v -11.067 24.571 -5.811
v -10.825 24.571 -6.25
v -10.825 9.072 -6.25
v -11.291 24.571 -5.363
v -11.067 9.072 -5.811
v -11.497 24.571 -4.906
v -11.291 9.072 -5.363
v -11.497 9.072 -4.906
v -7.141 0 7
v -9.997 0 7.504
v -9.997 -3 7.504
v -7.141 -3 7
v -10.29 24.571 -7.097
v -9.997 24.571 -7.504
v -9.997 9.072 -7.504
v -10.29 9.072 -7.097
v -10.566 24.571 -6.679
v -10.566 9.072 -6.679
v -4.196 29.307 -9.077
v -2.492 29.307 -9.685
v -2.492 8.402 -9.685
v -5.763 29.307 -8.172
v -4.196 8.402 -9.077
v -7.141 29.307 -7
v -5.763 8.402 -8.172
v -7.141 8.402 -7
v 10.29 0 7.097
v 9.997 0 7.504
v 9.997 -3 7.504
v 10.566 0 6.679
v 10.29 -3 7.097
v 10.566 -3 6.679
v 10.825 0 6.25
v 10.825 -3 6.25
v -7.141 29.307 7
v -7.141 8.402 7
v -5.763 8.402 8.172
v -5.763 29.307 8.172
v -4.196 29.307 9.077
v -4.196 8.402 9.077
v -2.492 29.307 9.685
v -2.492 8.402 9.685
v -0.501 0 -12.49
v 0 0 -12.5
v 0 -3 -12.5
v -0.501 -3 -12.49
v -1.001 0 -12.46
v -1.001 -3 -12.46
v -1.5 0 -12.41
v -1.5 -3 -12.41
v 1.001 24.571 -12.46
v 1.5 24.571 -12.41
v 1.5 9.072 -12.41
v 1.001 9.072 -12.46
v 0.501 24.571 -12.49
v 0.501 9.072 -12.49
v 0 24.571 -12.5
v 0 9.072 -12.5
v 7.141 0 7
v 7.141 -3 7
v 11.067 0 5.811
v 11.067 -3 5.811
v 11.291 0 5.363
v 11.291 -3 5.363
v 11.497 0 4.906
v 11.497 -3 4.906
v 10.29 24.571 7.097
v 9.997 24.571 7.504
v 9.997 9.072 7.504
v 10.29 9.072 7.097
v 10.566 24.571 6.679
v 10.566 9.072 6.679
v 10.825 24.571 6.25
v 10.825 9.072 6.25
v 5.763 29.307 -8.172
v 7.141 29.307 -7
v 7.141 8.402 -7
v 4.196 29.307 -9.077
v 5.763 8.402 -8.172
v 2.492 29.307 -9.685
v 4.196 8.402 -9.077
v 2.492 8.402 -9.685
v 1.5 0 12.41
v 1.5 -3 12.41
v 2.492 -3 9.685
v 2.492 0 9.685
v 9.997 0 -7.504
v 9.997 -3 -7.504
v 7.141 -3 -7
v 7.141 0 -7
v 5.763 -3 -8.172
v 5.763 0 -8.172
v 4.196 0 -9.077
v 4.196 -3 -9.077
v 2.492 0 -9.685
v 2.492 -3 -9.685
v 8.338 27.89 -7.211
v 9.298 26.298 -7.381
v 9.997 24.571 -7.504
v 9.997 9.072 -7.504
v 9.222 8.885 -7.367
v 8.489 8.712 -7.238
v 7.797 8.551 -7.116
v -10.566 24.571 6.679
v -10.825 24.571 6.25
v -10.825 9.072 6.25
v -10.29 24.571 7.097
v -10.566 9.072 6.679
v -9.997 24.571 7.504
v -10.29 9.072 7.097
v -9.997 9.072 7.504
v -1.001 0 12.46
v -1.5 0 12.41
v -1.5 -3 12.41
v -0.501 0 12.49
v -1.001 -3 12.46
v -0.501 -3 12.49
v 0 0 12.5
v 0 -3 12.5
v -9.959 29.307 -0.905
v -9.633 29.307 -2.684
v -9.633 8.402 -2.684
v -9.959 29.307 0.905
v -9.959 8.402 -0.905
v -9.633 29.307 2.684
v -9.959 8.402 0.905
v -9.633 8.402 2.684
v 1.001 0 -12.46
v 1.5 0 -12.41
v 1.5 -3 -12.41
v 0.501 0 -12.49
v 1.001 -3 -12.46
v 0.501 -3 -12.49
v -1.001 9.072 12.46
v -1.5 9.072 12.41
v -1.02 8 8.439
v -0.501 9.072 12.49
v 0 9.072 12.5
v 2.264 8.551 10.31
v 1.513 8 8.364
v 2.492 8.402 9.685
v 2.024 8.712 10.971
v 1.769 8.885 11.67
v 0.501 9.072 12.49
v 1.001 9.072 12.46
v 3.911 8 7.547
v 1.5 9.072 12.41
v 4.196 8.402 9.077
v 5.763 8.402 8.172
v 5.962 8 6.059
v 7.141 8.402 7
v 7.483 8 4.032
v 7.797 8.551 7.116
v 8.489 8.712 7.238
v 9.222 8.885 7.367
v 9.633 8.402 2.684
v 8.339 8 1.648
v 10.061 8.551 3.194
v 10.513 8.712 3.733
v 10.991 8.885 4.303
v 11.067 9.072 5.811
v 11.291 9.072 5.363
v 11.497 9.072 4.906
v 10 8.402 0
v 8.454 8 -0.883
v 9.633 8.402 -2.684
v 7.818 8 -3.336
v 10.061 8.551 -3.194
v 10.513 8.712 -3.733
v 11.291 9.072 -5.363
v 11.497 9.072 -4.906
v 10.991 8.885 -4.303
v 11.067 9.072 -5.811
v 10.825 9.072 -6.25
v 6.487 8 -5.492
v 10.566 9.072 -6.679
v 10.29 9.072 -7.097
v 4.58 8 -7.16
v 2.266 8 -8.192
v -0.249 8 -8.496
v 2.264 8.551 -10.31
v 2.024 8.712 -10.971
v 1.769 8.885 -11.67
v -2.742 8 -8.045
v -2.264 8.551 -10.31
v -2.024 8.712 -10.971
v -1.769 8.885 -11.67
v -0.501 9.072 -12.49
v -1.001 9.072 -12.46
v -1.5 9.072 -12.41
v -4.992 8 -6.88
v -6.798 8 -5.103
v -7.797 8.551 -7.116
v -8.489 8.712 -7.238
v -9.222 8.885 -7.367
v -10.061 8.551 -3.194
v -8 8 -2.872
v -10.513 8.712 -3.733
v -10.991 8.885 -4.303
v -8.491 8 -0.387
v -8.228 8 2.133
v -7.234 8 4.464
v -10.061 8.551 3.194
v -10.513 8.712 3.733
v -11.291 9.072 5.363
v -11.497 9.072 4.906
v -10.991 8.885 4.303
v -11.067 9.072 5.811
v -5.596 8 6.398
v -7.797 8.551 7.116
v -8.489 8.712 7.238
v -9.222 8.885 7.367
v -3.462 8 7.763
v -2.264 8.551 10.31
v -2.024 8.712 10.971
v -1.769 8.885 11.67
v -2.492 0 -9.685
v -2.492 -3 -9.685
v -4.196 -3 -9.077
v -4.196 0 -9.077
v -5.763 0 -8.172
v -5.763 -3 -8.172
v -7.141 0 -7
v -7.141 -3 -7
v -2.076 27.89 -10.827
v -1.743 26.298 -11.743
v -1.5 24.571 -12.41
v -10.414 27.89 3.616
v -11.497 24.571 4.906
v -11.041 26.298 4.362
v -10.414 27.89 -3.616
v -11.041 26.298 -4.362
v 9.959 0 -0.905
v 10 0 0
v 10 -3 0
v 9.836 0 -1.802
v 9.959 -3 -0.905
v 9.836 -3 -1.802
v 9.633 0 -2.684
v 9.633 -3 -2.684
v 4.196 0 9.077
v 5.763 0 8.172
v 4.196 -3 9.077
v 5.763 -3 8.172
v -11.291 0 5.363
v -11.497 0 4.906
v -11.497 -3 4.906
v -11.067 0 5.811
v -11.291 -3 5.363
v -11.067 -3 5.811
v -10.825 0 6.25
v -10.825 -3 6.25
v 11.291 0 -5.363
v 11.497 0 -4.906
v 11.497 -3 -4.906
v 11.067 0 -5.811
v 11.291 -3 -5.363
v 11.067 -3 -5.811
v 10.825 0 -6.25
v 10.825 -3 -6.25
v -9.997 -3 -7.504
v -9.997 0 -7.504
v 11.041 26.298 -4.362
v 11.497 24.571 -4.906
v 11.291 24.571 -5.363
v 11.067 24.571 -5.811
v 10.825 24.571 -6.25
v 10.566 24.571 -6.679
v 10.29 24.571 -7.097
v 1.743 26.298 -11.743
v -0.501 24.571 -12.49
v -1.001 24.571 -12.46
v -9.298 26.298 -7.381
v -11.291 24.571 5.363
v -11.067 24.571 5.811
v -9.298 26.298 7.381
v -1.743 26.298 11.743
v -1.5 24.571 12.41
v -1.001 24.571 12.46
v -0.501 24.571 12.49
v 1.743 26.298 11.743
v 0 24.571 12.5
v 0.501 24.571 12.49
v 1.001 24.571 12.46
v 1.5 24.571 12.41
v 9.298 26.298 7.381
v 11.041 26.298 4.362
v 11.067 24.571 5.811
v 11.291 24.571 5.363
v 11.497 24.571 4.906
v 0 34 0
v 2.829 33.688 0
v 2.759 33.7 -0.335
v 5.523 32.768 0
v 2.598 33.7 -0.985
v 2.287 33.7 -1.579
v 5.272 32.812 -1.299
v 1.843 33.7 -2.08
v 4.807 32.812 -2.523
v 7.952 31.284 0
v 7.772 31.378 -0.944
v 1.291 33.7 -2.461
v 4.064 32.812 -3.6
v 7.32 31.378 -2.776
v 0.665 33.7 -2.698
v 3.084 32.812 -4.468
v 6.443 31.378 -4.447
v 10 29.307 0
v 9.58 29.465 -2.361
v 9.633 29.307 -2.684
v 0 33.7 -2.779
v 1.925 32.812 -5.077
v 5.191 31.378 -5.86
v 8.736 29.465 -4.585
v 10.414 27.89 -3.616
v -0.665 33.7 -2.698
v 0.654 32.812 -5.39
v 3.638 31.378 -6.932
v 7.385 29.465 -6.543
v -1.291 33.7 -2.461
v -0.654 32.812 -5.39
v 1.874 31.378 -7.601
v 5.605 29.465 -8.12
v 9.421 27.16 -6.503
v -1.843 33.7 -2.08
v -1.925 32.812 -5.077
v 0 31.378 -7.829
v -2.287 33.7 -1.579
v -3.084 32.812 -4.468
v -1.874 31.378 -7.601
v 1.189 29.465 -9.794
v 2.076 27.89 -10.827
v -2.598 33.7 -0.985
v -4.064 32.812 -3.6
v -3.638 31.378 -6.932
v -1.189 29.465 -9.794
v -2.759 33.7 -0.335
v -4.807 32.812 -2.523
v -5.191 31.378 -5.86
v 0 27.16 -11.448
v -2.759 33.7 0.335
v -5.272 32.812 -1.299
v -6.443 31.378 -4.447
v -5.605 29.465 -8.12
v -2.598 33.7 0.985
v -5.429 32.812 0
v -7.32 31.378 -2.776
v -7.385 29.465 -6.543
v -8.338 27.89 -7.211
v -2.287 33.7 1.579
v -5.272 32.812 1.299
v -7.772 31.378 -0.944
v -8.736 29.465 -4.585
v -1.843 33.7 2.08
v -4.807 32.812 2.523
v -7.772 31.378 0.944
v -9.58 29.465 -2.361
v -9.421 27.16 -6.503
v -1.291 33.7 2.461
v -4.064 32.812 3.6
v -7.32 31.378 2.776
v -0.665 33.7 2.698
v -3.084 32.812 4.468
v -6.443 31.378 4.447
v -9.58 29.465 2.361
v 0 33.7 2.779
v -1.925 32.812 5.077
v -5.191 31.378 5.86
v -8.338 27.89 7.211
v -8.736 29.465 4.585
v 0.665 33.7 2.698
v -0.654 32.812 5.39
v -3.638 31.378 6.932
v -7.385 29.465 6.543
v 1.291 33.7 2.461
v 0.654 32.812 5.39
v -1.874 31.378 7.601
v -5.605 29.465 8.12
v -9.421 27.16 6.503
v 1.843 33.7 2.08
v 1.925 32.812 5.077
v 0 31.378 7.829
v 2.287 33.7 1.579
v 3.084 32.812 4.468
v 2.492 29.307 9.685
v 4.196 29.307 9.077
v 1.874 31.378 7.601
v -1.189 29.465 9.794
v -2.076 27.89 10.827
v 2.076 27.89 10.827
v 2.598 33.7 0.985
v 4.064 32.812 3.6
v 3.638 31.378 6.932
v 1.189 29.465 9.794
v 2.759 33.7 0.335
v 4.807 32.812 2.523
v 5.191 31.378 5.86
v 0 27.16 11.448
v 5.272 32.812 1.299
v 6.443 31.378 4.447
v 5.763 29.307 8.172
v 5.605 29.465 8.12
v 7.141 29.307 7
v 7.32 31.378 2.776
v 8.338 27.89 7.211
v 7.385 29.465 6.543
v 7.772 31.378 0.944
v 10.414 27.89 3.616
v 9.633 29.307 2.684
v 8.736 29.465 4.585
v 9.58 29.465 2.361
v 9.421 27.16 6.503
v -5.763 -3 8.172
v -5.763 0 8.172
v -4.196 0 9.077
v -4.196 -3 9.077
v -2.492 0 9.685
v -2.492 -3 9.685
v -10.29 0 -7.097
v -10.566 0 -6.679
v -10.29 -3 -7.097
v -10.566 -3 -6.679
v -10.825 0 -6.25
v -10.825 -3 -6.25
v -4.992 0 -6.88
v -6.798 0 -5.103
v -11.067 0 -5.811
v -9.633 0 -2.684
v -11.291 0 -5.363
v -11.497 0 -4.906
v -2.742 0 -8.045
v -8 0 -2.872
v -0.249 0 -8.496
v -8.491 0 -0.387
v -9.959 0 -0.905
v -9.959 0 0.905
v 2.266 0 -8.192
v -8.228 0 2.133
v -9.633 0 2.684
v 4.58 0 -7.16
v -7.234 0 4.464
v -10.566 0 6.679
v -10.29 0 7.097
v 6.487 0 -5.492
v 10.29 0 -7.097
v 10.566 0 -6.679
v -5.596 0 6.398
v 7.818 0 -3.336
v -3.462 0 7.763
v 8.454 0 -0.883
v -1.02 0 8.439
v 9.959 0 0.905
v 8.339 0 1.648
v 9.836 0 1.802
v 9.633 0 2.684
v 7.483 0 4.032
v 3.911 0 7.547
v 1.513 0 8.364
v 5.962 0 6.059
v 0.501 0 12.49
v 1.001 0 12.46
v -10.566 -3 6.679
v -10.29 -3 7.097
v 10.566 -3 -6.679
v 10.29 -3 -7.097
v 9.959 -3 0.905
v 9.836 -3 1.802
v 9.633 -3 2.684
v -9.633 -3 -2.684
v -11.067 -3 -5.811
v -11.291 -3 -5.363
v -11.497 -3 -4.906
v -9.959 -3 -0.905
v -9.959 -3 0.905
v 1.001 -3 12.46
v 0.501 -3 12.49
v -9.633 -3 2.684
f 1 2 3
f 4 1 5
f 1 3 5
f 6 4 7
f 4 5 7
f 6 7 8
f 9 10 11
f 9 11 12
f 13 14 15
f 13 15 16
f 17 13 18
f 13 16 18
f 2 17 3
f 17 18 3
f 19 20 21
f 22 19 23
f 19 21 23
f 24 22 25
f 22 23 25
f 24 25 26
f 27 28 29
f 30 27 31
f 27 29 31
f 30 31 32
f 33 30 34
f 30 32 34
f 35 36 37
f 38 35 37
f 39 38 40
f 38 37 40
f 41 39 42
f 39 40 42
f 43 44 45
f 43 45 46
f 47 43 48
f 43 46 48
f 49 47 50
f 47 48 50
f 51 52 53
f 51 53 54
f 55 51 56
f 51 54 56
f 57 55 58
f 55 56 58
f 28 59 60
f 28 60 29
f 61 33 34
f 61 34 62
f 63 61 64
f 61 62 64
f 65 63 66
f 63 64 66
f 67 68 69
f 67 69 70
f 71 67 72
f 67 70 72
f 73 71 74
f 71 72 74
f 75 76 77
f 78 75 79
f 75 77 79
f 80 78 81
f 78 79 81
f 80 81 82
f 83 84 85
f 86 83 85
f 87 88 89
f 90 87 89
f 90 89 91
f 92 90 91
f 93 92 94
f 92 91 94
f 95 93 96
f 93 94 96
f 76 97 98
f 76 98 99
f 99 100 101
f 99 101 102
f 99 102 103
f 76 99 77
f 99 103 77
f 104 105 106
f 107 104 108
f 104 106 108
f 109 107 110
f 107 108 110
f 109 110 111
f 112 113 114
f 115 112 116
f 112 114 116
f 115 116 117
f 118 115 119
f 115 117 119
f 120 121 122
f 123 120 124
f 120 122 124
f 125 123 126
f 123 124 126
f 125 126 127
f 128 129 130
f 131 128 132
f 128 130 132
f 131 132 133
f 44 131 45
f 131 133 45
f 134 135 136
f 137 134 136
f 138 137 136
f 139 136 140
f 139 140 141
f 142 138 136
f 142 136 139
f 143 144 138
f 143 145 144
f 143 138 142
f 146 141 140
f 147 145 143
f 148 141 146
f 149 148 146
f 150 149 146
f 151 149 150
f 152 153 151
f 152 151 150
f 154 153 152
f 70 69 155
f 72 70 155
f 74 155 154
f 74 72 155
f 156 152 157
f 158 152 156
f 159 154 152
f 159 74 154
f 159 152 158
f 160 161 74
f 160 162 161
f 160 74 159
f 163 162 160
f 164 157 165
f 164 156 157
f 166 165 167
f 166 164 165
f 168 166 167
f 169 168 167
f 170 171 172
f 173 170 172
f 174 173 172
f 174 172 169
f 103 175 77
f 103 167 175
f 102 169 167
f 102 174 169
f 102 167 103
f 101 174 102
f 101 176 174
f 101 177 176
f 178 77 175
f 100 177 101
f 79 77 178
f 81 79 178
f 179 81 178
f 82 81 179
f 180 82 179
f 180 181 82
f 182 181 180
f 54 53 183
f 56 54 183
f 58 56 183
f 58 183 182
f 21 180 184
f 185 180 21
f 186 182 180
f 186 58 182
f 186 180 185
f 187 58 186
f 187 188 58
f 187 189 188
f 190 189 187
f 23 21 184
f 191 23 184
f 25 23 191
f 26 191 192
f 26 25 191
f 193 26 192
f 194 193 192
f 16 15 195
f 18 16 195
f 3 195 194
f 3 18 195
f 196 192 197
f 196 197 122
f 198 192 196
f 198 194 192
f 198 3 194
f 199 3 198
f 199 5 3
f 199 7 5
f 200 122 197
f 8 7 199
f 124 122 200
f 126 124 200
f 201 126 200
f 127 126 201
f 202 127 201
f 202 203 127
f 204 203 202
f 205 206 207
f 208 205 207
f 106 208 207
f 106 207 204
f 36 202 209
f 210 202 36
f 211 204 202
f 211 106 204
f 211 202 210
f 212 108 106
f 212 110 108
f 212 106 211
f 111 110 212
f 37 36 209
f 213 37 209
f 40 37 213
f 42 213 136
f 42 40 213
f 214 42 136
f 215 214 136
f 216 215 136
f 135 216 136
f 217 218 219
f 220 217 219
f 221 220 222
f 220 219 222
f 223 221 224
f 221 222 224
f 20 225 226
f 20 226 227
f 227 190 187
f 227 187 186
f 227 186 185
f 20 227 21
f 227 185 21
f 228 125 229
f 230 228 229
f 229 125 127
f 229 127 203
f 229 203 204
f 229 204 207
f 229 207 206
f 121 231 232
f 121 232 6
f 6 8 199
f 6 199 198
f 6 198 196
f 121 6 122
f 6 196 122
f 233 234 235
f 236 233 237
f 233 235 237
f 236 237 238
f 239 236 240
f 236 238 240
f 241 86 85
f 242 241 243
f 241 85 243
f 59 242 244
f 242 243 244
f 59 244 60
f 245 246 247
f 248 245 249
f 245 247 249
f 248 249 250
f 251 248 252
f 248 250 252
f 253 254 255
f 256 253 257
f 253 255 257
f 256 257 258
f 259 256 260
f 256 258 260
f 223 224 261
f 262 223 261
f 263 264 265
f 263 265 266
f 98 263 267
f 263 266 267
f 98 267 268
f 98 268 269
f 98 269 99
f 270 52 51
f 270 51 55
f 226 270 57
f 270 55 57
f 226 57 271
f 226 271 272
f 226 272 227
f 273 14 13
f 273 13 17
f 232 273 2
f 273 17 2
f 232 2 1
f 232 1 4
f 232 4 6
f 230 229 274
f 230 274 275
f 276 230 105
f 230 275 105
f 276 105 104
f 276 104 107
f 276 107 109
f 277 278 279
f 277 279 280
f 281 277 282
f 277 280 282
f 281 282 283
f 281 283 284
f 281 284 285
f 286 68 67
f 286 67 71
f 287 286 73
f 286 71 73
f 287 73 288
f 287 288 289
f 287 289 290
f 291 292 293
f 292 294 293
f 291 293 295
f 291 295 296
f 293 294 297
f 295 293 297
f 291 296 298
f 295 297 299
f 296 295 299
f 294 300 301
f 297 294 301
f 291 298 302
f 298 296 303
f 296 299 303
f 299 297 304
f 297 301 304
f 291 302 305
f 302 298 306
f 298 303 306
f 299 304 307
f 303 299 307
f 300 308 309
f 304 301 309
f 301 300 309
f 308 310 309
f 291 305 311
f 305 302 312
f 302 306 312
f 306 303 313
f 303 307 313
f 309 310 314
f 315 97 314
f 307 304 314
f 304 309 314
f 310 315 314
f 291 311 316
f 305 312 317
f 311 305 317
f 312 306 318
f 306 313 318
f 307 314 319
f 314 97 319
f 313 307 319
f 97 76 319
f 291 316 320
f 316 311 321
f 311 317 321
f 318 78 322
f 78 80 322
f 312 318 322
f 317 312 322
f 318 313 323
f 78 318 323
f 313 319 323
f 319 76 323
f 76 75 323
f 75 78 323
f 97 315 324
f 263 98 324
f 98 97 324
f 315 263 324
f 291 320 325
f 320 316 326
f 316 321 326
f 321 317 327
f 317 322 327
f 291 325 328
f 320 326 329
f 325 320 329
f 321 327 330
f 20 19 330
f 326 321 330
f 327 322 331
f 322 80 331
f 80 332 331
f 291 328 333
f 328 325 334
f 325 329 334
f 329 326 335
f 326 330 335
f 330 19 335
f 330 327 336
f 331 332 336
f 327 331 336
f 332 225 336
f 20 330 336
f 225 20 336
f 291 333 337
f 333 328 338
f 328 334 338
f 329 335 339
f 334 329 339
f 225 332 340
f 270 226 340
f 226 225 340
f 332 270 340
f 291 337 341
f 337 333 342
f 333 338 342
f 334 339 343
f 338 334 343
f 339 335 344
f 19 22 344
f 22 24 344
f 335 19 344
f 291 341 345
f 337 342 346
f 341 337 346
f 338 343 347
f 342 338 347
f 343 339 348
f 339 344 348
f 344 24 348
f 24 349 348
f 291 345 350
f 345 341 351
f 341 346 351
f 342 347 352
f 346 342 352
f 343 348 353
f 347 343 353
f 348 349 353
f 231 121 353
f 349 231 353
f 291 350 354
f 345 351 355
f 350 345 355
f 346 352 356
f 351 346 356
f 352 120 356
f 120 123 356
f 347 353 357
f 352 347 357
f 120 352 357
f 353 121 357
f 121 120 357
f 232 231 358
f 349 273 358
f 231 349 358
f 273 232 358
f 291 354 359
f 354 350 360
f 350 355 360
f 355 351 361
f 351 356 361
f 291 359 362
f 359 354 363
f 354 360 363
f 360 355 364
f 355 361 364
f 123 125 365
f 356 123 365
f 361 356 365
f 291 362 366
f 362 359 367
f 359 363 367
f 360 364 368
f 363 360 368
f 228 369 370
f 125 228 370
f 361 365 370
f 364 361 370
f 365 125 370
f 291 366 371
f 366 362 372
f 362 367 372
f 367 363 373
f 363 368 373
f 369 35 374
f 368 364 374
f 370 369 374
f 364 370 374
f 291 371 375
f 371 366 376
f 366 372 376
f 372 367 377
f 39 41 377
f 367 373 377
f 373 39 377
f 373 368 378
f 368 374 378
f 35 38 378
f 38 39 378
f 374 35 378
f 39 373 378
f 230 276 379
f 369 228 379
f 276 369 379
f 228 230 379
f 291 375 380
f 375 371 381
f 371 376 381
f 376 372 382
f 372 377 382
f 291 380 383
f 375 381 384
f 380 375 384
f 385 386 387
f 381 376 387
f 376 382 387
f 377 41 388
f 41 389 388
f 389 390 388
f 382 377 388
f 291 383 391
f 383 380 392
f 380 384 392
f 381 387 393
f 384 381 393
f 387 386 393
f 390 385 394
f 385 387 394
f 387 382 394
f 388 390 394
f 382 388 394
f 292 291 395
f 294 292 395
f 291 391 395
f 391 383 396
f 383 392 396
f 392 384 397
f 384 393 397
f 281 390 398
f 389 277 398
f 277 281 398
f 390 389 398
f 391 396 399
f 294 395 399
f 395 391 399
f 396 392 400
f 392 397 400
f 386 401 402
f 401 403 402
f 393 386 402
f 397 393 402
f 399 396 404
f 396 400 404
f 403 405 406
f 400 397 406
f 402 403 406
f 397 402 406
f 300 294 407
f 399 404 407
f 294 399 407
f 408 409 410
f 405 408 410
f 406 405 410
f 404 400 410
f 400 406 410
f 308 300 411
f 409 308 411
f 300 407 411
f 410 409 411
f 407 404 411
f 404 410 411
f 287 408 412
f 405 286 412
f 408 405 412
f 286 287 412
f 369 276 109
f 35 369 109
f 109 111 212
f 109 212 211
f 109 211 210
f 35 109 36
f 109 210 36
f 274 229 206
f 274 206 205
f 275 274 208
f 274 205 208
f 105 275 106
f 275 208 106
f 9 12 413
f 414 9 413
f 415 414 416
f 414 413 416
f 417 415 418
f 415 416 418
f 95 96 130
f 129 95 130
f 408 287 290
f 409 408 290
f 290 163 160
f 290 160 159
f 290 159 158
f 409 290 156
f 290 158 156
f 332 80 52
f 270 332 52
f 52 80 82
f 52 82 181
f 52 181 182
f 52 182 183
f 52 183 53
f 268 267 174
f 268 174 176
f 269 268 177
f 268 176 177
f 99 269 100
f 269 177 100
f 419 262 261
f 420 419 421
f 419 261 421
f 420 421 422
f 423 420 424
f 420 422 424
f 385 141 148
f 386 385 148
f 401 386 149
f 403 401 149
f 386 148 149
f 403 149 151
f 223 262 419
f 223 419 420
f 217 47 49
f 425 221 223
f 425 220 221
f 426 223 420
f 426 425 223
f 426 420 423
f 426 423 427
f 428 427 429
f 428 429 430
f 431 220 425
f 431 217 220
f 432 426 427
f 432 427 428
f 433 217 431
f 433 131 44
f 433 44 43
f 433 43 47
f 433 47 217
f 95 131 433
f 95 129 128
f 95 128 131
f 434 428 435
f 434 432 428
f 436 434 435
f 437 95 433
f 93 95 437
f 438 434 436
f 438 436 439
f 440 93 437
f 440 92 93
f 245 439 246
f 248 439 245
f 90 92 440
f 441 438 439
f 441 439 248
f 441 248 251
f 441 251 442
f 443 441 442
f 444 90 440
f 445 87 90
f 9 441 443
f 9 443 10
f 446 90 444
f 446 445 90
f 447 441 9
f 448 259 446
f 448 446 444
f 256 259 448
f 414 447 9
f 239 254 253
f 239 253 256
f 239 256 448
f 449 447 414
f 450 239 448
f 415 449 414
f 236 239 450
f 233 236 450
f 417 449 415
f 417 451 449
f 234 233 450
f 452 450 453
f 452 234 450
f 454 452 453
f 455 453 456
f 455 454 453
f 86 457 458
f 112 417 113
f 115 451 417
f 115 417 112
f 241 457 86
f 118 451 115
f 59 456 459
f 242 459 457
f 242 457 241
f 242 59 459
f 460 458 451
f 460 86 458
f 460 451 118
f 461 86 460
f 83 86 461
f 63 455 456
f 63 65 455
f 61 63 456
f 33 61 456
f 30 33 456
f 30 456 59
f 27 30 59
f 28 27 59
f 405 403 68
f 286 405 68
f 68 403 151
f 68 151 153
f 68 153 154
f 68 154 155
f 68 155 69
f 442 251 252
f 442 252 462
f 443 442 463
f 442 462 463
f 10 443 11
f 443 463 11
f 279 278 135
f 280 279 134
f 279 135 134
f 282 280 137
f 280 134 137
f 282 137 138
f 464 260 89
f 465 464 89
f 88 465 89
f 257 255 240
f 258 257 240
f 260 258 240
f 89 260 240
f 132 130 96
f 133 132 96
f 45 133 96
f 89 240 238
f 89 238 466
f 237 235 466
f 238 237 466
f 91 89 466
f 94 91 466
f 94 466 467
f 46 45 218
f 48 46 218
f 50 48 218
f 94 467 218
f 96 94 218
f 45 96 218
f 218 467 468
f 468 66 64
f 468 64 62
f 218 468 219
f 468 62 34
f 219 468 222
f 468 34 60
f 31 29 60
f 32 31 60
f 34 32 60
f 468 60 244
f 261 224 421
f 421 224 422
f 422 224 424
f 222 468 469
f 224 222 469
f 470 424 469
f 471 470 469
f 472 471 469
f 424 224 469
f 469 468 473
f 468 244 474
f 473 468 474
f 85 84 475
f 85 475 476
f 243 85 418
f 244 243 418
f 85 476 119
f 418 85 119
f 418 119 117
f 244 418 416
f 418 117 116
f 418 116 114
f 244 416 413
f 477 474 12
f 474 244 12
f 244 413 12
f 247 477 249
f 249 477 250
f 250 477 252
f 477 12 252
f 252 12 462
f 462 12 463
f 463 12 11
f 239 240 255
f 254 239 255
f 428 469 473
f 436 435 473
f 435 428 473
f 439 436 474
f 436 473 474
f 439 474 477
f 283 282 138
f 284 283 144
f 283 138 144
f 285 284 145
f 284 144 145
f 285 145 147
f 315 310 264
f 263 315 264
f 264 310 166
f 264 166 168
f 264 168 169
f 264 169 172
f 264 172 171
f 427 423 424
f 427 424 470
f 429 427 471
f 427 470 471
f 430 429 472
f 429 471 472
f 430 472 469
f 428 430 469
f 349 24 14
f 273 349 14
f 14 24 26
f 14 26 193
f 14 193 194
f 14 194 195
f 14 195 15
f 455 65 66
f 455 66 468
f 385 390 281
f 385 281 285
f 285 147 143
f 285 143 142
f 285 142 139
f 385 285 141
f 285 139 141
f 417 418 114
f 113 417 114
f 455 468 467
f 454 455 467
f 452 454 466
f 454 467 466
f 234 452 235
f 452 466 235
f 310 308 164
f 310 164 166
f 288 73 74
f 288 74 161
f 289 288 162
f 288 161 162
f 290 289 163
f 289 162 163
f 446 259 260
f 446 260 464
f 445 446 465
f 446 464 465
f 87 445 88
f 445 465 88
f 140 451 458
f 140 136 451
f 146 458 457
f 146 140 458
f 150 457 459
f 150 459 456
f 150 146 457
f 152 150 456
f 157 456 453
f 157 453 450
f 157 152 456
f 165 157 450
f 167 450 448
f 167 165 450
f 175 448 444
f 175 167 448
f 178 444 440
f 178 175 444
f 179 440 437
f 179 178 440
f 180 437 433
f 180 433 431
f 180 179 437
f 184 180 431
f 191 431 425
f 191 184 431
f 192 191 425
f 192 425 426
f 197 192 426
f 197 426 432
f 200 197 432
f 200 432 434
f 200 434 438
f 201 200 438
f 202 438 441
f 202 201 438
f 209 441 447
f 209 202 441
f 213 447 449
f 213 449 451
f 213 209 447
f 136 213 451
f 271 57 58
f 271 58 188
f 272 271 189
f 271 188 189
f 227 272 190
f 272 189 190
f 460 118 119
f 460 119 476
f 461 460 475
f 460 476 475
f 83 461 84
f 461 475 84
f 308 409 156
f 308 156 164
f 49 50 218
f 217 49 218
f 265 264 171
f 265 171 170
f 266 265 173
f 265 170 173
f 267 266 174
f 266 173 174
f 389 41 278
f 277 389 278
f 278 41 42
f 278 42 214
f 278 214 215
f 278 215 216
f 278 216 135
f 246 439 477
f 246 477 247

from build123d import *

# Parameters (mm, degrees)
EXTRUDE_1_DEPTH          = 34
EXTRUDE_1_DEPTH_BACK     = 3
EXTRUDE_START            = -3
EXTRUDE_2_DEPTH          = 37
PATTERN_CIRCULAR_1_COUNT = 6


# Read off the part's stored shape, not the designer's step: 切除-旋转-薄壁1
with BuildPart() as part:
    # 草图2 → 凸台-拉伸1 (new, two sides: drawn at the far end of the back side and taken through both)
    with BuildSketch(Plane(origin=(0, 0, 0), x_dir=(1, 0, 0), z_dir=(0, 1, 0)).offset(-EXTRUDE_1_DEPTH_BACK)):
        with BuildLine():
            ThreePointArc((-2.491861702, -9.684556018), (-1.255874162, -9.920825575), (0, -10))
            Line((0, -10), (0, 10))
            ThreePointArc((0, 10), (-9.920825575, 1.255874162), (-2.491861702, -9.684556018))
        make_face()
        with BuildLine():
            Line((0, 10), (0, -10))
            ThreePointArc((0, -10), (1.255874162, -9.920825575), (2.491861702, -9.684556018))
            ThreePointArc((2.491861702, -9.684556018), (7.903120175, -6.127045903), (10, 0))
            ThreePointArc((10, 0), (7.071067812, 7.071067812), (0, 10))
        make_face()
    extrude(amount=EXTRUDE_1_DEPTH + EXTRUDE_1_DEPTH_BACK)

    # 草图2<3> → 凸台-拉伸2 (add)
    with BuildSketch(Plane(origin=(0, 0, 0), x_dir=(1, 0, 0), z_dir=(0, 1, 0)).offset(EXTRUDE_START)):
        with BuildLine():
            ThreePointArc((-1.5, -12.409673646), (-0.751358578, -12.477397977), (0, -12.5))
            Line((0, -12.5), (0, -10))
            ThreePointArc((0, -10), (-1.255874162, -9.920825575), (-2.491861702, -9.684556018))
            Line((-2.491861702, -9.684556018), (-1.5, -12.409673646))
        make_face()
        with BuildLine():
            Line((0, -10), (0, -12.5))
            ThreePointArc((0, -12.5), (0.751358578, -12.477397977), (1.5, -12.409673646))
            Line((1.5, -12.409673646), (2.491861702, -9.684556018))
            ThreePointArc((2.491861702, -9.684556018), (1.255874162, -9.920825575), (0, -10))
        make_face()
    extrude_2 = extrude(amount=EXTRUDE_2_DEPTH)

    # 阵列(圆周)1: 凸台-拉伸2 ×6 about axis
    pattern_circular_1_axis = Axis((0, 0, 0), (0, 1, 0))
    for i in range(1, PATTERN_CIRCULAR_1_COUNT):
        add(extrude_2.rotate(pattern_circular_1_axis, i * 360 / PATTERN_CIRCULAR_1_COUNT))

    # 草图3 → 切除-旋转1 (revolve, cut)
    with BuildSketch(Plane(origin=(0, 0, 0), x_dir=(0, 0, -1), z_dir=(1, 0, 0)), mode=Mode.PRIVATE) as cut_revolve_1_sk:
        Polygon((-12.5, 0), (-8.5, 0), (-8.5, 8), (-12.5, 9.07179677), align=None)
    revolve(cut_revolve_1_sk.sketch.rotate(Axis((0, -3, 0), (0, 1, 0)), 353.107897421), axis=Axis((0, -3, 0), (0, 1, 0)), mode=Mode.SUBTRACT)

    # 切除-旋转-薄壁1 outline → 切除-旋转-薄壁1 (revolve, cut)
    with BuildSketch(Plane.XY):
        with BuildLine():
            ThreePointArc((0, 34), (7.828815855, 31.378325603), (12.500000004, 24.570714202))
            Line((12.500000004, 24.570714202), (12.500000004, 34))
            Line((12.500000004, 34), (0, 34))
        make_face()
    revolve(axis=Axis((0, 0, 0), (0, 1, 0)), mode=Mode.SUBTRACT)


solid = part.part
